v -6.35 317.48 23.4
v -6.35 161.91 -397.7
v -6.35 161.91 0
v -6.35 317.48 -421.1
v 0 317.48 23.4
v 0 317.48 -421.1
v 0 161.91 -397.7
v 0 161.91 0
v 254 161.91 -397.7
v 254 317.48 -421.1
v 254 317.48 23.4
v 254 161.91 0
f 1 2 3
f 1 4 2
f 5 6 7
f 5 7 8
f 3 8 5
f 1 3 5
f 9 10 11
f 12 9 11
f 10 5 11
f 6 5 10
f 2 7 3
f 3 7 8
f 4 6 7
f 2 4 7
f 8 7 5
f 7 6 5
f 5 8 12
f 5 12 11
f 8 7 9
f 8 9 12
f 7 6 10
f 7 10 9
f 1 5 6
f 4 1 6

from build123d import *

# Parameters (mm, degrees)
BOSS_EXTRUDE1_DEPTH = 254
BOSS_EXTRUDE2_DEPTH = 6.35


with BuildPart() as part:
    # Sketch1 → Boss-Extrude1 (new body)
    with BuildSketch(Plane(origin=(0, 0, 0), x_dir=(0, 0, -1), z_dir=(1, 0, 0))):
        Polygon((0, 161.91), (-23.4, 317.48), (421.1, 317.48), (397.7, 161.91), align=None)
    extrude(amount=BOSS_EXTRUDE1_DEPTH)


with BuildPart() as body_2:
    # Sketch5 → Boss-Extrude2 (new body)
    with BuildSketch(Plane.ZY):
        Polygon((-397.7, 161.91), (0, 161.91), (23.4, 317.48), (-421.1, 317.48), align=None)
    extrude(amount=BOSS_EXTRUDE2_DEPTH)


solid = Compound([part.part, body_2.part])
